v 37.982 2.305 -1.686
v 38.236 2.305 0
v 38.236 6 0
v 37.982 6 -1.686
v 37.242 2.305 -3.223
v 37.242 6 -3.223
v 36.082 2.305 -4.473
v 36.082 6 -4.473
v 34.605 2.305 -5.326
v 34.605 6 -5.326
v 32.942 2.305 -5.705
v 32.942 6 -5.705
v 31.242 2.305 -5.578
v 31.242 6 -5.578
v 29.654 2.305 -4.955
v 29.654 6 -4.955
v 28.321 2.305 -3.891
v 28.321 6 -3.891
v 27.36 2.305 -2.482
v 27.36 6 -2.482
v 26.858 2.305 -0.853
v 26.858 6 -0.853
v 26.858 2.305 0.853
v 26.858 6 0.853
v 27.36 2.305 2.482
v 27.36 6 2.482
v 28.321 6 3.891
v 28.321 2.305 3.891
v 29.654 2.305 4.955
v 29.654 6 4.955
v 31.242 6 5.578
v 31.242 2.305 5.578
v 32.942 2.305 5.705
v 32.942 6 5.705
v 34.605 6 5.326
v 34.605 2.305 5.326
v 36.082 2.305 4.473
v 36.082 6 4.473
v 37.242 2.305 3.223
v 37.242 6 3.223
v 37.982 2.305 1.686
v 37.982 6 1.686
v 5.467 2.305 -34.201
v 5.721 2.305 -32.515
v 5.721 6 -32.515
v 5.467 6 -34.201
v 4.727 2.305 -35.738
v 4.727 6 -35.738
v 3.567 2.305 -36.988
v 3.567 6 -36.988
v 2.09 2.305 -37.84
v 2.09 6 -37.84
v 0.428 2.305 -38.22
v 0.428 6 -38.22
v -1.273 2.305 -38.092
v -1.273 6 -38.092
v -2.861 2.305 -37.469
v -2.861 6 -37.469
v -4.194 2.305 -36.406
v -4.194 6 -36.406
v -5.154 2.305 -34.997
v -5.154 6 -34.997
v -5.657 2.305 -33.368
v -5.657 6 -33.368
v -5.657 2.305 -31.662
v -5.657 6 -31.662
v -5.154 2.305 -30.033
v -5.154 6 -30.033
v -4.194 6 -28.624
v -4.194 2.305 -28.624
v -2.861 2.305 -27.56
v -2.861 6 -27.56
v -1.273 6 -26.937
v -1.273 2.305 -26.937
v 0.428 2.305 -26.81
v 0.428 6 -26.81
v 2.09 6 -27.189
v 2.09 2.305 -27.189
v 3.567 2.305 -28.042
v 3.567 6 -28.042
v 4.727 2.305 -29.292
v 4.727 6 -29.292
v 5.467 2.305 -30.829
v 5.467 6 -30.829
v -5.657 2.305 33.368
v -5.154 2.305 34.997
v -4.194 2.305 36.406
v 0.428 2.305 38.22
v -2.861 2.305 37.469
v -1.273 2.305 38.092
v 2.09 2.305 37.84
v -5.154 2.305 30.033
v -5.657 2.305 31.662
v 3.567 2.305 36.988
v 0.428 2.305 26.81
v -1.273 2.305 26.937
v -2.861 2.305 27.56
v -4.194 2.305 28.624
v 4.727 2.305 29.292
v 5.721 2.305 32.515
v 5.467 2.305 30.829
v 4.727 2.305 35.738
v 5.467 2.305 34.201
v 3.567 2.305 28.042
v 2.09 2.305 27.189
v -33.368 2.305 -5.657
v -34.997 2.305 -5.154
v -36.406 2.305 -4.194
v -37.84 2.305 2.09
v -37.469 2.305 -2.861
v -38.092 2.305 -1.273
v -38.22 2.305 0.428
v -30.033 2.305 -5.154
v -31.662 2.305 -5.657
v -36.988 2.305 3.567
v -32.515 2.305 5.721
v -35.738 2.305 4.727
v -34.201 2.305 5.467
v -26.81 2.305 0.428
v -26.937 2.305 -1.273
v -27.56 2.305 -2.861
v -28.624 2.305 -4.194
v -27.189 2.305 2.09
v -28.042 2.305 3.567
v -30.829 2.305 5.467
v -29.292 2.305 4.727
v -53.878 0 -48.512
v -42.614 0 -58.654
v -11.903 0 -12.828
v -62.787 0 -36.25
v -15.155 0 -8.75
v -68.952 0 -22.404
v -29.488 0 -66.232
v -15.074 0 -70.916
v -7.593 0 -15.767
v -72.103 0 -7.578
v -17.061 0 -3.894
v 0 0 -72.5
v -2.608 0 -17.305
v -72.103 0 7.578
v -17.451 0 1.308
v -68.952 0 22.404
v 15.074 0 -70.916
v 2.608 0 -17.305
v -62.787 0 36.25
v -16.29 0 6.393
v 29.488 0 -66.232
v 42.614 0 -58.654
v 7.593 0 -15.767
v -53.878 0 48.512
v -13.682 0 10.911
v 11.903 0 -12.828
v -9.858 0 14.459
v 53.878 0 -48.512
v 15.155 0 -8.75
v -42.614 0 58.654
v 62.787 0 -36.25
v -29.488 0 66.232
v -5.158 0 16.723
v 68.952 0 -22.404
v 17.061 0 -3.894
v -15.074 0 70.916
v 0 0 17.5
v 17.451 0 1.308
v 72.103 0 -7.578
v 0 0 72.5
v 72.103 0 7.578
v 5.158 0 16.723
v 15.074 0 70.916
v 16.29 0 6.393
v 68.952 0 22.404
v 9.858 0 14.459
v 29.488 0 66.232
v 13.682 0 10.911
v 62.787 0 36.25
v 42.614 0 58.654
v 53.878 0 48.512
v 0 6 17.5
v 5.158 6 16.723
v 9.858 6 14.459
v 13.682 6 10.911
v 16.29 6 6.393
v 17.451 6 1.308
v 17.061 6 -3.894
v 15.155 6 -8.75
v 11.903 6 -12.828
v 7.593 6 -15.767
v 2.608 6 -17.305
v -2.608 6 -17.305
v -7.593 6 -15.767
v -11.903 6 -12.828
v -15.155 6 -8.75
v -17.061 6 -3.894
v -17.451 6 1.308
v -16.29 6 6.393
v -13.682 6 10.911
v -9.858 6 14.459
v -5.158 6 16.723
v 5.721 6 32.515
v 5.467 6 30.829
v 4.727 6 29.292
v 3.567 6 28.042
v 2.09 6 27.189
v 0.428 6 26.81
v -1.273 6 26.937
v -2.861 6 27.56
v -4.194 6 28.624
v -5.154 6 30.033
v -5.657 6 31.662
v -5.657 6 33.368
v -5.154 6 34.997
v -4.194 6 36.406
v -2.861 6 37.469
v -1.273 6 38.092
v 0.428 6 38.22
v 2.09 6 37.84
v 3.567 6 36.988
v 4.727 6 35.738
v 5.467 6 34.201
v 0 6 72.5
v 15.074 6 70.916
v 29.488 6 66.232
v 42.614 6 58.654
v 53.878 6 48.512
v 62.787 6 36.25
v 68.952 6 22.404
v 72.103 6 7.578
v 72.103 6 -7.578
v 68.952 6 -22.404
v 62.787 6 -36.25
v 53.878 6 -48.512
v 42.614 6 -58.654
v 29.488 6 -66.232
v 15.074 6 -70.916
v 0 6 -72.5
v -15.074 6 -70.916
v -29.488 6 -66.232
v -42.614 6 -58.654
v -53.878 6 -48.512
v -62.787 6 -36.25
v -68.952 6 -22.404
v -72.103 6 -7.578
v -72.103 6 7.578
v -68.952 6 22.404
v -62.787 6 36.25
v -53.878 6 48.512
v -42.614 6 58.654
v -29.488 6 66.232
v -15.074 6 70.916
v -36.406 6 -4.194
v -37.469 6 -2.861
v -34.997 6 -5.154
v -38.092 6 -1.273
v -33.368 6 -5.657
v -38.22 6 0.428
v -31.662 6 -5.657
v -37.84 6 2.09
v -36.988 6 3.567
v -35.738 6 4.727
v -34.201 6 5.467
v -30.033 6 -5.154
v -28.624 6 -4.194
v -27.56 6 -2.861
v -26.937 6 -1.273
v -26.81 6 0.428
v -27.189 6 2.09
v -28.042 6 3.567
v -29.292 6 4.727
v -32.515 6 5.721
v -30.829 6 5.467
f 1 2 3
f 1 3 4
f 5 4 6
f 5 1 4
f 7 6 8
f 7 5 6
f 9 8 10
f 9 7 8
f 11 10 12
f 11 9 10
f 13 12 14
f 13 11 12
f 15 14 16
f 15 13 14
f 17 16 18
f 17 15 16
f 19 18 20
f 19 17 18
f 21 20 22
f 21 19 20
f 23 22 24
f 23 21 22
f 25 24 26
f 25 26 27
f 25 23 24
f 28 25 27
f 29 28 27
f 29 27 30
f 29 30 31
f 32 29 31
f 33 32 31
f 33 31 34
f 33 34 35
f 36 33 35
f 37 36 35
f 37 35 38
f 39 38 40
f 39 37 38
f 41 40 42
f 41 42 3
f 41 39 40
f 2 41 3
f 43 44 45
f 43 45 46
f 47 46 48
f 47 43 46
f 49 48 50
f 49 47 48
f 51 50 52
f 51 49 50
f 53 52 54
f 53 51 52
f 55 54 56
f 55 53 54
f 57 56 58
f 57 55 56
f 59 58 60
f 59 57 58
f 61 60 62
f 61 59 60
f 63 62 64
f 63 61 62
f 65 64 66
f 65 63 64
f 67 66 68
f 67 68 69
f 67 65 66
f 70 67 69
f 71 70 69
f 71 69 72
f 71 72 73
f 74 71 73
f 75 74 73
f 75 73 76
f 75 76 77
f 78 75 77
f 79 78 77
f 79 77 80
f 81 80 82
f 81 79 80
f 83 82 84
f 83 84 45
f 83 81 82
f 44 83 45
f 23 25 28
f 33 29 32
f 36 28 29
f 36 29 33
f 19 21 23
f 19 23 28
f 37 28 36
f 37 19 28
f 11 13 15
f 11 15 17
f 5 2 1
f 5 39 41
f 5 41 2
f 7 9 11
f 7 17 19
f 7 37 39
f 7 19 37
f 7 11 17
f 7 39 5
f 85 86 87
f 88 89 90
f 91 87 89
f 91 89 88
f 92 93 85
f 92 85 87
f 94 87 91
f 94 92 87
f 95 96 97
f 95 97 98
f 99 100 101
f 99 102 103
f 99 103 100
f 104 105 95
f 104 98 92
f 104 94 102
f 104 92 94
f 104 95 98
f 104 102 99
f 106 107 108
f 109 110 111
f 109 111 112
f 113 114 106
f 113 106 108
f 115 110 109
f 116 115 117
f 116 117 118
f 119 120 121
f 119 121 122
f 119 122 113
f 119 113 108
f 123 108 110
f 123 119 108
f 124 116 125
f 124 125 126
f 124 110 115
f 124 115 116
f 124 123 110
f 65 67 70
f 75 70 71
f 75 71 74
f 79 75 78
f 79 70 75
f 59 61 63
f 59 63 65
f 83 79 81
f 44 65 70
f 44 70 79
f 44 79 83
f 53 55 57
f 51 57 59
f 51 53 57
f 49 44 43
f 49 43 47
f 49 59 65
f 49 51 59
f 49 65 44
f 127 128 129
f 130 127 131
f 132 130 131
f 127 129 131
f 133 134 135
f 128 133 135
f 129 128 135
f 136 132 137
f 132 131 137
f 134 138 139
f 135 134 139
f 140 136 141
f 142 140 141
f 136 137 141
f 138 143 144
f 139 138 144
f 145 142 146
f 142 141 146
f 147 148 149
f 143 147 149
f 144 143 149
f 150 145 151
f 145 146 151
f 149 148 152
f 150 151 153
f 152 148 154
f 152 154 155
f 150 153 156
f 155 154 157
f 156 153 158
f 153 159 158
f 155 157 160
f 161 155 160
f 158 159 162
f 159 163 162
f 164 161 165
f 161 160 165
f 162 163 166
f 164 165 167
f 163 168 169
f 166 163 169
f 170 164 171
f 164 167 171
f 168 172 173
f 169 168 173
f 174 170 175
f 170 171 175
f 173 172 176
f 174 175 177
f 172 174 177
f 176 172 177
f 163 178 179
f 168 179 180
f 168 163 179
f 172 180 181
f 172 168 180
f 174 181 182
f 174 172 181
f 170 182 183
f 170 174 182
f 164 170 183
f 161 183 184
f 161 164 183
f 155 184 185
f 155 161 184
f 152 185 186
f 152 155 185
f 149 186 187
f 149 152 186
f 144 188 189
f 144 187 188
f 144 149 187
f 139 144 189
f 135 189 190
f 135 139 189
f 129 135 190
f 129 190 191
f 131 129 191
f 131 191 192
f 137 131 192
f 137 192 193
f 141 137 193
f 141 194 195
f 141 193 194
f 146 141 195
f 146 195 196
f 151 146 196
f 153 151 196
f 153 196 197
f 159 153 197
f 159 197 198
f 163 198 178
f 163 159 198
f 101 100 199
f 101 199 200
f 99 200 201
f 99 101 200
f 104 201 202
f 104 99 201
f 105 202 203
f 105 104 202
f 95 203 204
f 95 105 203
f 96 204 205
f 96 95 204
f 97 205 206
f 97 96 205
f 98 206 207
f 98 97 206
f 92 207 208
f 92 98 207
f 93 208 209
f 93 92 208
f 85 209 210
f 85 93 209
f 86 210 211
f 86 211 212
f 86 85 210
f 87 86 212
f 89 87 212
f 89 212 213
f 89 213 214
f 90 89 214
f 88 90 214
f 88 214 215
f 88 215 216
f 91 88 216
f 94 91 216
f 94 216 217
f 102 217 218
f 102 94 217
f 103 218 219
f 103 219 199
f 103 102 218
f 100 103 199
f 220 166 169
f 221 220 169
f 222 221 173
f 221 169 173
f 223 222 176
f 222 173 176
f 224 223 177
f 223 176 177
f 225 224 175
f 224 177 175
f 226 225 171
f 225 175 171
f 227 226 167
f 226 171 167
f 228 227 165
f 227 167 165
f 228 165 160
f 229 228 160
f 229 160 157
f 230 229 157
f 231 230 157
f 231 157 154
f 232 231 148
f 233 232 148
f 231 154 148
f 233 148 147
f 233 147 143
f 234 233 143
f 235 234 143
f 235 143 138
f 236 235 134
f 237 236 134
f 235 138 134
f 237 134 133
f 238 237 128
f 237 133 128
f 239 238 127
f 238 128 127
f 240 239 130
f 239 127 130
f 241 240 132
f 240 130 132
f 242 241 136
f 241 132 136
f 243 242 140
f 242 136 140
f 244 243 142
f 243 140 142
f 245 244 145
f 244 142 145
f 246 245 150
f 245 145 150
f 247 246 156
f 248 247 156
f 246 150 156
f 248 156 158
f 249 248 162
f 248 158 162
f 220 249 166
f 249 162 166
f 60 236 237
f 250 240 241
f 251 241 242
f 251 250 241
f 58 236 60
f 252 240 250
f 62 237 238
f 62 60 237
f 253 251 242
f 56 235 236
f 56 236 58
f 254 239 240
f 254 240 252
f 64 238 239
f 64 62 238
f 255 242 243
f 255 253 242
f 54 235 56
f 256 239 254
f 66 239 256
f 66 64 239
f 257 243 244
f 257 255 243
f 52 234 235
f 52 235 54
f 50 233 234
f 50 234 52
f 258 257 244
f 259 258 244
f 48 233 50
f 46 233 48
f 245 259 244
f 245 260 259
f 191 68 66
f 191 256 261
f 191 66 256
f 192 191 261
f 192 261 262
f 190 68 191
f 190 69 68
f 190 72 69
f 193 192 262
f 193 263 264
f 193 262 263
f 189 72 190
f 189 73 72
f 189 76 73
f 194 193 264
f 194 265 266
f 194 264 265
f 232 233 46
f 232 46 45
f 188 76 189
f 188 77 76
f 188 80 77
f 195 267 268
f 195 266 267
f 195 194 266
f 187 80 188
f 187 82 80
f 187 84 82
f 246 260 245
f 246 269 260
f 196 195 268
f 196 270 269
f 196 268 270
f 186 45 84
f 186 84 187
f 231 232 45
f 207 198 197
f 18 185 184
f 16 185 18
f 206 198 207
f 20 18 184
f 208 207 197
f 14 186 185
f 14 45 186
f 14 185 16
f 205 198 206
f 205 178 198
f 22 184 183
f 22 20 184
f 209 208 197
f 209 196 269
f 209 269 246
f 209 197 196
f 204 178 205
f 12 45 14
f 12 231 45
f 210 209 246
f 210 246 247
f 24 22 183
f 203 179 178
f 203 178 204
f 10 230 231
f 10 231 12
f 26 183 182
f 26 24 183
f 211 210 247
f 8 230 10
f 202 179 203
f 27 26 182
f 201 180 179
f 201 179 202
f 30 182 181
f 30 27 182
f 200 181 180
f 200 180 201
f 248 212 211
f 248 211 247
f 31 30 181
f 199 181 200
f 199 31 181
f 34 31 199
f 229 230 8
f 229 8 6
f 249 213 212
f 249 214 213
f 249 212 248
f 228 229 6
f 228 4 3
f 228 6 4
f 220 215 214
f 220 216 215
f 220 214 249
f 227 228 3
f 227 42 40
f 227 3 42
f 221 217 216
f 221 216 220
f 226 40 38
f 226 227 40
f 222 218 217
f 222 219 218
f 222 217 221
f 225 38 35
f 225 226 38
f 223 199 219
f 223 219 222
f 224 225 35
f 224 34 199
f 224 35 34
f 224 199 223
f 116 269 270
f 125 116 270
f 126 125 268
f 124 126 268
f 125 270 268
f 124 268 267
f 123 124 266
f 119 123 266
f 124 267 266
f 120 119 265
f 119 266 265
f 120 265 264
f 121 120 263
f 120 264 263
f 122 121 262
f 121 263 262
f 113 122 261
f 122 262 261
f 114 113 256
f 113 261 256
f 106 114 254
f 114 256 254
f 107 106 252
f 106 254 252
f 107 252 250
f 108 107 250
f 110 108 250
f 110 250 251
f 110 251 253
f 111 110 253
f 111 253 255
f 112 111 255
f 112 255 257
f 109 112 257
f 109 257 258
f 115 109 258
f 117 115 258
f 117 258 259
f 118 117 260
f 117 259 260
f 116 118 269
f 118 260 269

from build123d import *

# Parameters (mm, degrees)
SKETCH1_R           = 72.5
BOSS_EXTRUDE1_DEPTH = 6
SKETCH2_R           = 17.5
CUT_EXTRUDE1_DEPTH  = 103.705890776
SKETCH3_R           = 5.721006682
CUT_EXTRUDE2_DEPTH  = 3.694640352
CIRPATTERN1_COUNT   = 4


with BuildPart() as part:
    # Sketch1 → Boss-Extrude1 (new body)
    with BuildSketch(Plane(origin=(0, 0, 0), x_dir=(1, 0, 0), z_dir=(0, 1, 0))):
        Circle(SKETCH1_R)
    extrude(amount=BOSS_EXTRUDE1_DEPTH)

    # Sketch2 → Cut-Extrude1 (cut, through all)
    with BuildSketch(Plane(origin=(0, 0, 0), x_dir=(1, 0, 0), z_dir=(0, 1, 0))):
        Circle(SKETCH2_R)
    extrude(amount=CUT_EXTRUDE1_DEPTH, mode=Mode.SUBTRACT)

    # Sketch3 → Cut-Extrude2 (cut)
    with BuildSketch(Plane(origin=(0, 6, 0), x_dir=(1, 0, 0), z_dir=(0, 1, 0))):
        with Locations((-32.5149274, 0)):
            Circle(SKETCH3_R)
    cut_extrude2 = extrude(amount=-CUT_EXTRUDE2_DEPTH, mode=Mode.SUBTRACT)

    # CirPattern1: Cut-Extrude2 ×4 about axis
    cirpattern1_axis = Axis((0, 0, 0), (0, 1, 0))
    for i in range(1, CIRPATTERN1_COUNT):
        add(cut_extrude2.rotate(cirpattern1_axis, i * 360 / CIRPATTERN1_COUNT), mode=Mode.SUBTRACT)


solid = part.part
